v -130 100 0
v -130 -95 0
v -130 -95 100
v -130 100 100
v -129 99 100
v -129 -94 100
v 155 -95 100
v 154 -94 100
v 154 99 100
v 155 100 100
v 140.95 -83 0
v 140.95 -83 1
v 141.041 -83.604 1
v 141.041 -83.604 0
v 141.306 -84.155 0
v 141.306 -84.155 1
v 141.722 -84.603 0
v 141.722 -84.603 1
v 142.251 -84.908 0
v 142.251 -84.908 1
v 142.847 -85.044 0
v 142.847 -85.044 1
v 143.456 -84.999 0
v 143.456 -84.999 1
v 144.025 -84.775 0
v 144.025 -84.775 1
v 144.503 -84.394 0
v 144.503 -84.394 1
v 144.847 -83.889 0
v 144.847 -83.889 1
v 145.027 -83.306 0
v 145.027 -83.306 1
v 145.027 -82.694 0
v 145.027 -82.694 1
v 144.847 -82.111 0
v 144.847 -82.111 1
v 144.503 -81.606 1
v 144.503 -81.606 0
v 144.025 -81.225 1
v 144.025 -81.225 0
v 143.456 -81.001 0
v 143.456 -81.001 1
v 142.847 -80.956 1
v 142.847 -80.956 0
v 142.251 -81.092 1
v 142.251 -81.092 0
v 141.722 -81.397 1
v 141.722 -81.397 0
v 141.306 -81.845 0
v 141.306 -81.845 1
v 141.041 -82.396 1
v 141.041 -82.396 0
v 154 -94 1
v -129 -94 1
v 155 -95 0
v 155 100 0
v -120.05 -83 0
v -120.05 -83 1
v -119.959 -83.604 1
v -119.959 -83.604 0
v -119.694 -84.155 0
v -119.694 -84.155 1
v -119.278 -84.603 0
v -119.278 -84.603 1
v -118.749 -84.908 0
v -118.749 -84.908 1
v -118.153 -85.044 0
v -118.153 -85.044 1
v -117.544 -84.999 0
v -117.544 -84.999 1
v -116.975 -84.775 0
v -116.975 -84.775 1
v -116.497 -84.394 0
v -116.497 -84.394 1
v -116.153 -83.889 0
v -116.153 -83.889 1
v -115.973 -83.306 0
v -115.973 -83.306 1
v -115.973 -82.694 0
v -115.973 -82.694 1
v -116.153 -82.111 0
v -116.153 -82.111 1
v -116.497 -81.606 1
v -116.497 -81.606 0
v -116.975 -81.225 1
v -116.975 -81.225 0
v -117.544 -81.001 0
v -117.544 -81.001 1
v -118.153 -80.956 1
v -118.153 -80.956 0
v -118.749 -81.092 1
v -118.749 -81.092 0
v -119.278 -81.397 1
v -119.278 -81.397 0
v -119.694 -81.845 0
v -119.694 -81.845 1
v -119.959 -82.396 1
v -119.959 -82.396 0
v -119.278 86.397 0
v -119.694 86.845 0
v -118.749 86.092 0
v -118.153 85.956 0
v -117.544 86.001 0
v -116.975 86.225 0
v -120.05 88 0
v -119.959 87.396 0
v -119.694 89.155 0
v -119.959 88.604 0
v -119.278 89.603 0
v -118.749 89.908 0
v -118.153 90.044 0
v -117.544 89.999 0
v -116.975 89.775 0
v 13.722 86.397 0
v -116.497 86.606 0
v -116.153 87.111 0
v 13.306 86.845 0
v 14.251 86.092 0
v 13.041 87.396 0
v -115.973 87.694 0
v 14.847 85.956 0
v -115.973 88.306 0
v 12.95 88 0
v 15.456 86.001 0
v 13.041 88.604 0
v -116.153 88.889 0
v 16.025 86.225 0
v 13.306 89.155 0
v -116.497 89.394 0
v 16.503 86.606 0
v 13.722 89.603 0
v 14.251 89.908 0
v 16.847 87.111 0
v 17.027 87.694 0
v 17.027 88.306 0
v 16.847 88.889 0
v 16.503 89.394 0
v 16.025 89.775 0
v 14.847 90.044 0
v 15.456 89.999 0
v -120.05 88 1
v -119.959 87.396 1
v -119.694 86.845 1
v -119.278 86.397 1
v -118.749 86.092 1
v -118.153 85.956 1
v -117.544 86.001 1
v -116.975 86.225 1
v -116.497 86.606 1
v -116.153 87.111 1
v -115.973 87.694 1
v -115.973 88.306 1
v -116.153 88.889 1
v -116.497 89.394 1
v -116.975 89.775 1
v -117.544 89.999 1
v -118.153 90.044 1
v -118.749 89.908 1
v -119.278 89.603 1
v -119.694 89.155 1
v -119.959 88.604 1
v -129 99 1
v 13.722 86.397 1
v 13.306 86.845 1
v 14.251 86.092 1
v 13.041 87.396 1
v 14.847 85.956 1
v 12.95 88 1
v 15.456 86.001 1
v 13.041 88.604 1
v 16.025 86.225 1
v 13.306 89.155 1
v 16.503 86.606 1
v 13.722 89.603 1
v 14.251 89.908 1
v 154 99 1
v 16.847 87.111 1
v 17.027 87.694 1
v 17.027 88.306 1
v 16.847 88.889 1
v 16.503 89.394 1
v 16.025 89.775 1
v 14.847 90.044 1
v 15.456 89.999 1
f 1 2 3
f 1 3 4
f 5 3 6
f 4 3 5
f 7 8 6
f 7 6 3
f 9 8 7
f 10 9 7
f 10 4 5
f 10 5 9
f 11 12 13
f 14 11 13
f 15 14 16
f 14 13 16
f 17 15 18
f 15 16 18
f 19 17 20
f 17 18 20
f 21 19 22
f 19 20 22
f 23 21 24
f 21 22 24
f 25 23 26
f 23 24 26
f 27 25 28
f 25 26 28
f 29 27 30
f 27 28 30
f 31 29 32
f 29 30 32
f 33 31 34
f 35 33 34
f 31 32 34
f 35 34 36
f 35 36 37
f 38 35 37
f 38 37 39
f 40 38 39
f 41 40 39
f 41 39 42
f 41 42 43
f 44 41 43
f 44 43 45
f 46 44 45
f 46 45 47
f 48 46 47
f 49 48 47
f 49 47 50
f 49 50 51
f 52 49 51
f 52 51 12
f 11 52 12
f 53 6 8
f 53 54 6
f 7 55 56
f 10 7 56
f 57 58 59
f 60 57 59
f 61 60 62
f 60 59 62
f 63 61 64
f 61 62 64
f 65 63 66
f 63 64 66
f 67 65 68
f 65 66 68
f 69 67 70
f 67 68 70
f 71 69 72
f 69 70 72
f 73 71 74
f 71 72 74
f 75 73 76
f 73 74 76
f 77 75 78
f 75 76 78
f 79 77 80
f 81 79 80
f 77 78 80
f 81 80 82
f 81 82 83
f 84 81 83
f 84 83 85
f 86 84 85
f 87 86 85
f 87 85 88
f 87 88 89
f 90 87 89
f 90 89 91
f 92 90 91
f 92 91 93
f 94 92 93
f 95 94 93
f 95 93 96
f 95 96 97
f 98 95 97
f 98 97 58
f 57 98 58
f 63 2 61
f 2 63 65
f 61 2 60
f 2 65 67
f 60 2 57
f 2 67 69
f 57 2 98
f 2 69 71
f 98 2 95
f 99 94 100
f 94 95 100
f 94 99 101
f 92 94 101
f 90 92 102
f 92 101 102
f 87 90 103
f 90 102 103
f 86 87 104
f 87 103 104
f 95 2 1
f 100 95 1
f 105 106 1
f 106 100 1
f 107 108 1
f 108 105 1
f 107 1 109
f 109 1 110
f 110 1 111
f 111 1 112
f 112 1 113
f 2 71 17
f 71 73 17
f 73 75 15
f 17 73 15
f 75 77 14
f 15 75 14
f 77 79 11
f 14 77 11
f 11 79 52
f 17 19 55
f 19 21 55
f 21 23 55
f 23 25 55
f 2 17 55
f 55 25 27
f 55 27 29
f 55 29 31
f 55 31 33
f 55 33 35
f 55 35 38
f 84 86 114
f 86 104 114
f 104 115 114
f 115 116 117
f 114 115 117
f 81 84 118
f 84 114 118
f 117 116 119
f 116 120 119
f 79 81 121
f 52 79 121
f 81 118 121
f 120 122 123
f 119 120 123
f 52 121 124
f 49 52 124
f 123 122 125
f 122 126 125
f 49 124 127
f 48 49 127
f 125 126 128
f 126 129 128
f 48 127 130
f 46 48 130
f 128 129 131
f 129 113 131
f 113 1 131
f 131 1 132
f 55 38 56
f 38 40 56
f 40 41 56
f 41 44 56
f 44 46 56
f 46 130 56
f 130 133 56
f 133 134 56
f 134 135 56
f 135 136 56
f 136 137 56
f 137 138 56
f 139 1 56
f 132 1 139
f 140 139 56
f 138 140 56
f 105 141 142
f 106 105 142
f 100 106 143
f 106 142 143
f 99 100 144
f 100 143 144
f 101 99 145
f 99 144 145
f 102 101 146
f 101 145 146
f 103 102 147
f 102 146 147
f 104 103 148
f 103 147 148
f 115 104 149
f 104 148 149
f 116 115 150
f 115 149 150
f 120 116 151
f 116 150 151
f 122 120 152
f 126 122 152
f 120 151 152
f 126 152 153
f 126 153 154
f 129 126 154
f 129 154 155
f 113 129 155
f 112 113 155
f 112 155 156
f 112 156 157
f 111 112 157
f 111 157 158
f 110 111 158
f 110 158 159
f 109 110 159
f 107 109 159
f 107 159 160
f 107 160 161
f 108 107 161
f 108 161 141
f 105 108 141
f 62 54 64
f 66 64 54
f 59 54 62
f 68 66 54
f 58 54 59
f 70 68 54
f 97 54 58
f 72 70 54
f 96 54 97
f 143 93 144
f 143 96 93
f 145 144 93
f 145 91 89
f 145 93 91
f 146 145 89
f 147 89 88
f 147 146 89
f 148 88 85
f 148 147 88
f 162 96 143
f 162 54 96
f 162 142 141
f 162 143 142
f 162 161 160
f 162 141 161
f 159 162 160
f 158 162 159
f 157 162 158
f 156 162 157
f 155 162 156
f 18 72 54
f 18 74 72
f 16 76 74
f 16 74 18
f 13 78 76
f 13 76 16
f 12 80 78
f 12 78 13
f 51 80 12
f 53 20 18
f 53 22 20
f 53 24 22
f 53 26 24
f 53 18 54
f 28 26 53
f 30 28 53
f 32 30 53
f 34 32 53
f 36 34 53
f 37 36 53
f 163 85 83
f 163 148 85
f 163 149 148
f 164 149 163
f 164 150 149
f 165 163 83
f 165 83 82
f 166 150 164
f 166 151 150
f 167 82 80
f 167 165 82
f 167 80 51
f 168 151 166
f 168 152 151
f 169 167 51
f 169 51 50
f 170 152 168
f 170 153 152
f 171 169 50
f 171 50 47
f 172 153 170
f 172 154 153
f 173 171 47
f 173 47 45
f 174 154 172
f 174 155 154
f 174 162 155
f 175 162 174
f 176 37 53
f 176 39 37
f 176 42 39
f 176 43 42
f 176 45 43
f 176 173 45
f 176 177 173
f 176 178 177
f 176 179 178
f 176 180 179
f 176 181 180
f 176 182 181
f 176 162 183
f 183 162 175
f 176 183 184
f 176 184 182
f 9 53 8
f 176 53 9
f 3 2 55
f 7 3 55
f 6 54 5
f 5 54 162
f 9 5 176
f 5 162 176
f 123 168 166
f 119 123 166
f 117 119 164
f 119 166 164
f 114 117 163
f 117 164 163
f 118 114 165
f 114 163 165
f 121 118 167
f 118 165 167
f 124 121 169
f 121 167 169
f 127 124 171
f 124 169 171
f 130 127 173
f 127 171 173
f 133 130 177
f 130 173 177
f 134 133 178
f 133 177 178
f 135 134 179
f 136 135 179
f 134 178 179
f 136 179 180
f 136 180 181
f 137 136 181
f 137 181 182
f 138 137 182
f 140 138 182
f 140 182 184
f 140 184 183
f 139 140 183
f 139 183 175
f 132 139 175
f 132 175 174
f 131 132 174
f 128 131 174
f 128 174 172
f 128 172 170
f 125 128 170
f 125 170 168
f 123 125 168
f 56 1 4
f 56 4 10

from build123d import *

# Parameters (mm, degrees)
F0_W     = 285
F0_H     = 195
F1_DEPTH = 100
F2_T     = -1
F3_D     = 4.1


# Not quite as in the source:
# - a feature names something its author has since deleted; it is built from what else it names


with BuildPart() as f1:
    # F0 (on Top) → F1 (new body)
    with BuildSketch(Plane.XY):
        with Locations((12.5, 2.5)):
            Rectangle(F0_W, F0_H)
    extrude(amount=F1_DEPTH)

    # F2
    f2_openings = [f1.faces().sort_by_distance(p)[0] for p in [
        (12.5, 2.5, 100),
    ]]
    offset(amount=F2_T, openings=f2_openings)

    # F3 (through all)
    with Locations(Plane(origin=(0, 0, 0), x_dir=(1, 0, 0), z_dir=(0, 0, -1))):
        with Locations((15, -88), (-118, -88), (143, 83), (-118, 83)):
            Hole(F3_D / 2)


solid = f1.part
